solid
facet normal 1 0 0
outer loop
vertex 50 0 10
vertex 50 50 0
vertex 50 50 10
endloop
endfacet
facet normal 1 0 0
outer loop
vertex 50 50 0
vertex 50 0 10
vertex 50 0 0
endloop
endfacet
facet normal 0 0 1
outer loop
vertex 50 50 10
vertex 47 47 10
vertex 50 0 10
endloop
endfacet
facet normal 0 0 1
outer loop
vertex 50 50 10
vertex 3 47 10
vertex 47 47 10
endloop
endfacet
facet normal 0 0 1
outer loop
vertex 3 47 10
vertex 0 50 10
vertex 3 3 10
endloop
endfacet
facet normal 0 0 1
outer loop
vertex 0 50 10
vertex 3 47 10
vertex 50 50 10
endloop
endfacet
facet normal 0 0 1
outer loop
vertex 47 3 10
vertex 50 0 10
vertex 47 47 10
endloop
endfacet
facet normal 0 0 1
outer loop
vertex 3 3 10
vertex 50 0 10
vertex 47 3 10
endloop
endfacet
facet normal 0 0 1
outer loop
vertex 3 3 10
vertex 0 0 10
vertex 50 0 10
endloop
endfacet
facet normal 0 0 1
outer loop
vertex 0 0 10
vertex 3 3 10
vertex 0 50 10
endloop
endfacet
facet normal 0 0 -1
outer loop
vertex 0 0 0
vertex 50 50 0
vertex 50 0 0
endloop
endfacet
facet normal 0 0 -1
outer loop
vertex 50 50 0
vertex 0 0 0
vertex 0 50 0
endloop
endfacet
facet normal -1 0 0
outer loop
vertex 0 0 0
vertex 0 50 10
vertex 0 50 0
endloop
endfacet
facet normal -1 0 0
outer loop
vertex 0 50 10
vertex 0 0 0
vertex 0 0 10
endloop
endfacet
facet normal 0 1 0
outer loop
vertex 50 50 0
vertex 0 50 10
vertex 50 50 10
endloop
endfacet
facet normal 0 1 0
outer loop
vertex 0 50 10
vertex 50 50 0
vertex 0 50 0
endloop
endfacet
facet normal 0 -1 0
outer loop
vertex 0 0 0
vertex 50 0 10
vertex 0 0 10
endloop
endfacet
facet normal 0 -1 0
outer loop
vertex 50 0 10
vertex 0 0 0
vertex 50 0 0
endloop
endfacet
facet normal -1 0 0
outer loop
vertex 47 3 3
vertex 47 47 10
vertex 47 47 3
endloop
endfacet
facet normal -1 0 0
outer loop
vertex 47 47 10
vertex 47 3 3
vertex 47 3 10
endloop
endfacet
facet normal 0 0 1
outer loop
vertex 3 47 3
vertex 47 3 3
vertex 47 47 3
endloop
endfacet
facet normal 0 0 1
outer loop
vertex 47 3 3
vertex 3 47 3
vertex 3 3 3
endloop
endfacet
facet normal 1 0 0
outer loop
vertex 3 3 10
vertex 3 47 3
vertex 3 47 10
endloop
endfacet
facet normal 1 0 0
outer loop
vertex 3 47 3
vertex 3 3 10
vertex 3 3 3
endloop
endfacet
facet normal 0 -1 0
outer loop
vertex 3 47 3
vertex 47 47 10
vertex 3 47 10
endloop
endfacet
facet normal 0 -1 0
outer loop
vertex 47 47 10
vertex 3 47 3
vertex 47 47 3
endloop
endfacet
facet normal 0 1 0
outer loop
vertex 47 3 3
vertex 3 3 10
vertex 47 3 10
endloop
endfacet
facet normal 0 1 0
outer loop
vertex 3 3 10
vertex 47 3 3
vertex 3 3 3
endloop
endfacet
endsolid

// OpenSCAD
// Generated by HEIDI for job job_1787781908954_43bf4574
// Product: 3D-Printable Model Preparation Package
// Request: Failure injection test
// Model type: box
// Generated: 2026-09-07T04:35:15.733Z
//
// This is a parameterized OpenSCAD model. You can adjust the
// parameters below to customize the dimensions before rendering.

// ─── Parameters ───
width = 50;       // X dimension in mm
height = 50;     // Y dimension in mm
depth = 10;       // Z dimension in mm
wall = 3;    // wall thickness in mm
$fn = 60;               // facet resolution

// Parametric hollow box
module parametric_box() {
    difference() {
        // Outer shell
        cube([width, height, depth]);
        // Inner cavity
        translate([wall, wall, wall])
            cube([width - wall * 2, height - wall * 2, depth - wall + 1]);
    }
}
parametric_box();
